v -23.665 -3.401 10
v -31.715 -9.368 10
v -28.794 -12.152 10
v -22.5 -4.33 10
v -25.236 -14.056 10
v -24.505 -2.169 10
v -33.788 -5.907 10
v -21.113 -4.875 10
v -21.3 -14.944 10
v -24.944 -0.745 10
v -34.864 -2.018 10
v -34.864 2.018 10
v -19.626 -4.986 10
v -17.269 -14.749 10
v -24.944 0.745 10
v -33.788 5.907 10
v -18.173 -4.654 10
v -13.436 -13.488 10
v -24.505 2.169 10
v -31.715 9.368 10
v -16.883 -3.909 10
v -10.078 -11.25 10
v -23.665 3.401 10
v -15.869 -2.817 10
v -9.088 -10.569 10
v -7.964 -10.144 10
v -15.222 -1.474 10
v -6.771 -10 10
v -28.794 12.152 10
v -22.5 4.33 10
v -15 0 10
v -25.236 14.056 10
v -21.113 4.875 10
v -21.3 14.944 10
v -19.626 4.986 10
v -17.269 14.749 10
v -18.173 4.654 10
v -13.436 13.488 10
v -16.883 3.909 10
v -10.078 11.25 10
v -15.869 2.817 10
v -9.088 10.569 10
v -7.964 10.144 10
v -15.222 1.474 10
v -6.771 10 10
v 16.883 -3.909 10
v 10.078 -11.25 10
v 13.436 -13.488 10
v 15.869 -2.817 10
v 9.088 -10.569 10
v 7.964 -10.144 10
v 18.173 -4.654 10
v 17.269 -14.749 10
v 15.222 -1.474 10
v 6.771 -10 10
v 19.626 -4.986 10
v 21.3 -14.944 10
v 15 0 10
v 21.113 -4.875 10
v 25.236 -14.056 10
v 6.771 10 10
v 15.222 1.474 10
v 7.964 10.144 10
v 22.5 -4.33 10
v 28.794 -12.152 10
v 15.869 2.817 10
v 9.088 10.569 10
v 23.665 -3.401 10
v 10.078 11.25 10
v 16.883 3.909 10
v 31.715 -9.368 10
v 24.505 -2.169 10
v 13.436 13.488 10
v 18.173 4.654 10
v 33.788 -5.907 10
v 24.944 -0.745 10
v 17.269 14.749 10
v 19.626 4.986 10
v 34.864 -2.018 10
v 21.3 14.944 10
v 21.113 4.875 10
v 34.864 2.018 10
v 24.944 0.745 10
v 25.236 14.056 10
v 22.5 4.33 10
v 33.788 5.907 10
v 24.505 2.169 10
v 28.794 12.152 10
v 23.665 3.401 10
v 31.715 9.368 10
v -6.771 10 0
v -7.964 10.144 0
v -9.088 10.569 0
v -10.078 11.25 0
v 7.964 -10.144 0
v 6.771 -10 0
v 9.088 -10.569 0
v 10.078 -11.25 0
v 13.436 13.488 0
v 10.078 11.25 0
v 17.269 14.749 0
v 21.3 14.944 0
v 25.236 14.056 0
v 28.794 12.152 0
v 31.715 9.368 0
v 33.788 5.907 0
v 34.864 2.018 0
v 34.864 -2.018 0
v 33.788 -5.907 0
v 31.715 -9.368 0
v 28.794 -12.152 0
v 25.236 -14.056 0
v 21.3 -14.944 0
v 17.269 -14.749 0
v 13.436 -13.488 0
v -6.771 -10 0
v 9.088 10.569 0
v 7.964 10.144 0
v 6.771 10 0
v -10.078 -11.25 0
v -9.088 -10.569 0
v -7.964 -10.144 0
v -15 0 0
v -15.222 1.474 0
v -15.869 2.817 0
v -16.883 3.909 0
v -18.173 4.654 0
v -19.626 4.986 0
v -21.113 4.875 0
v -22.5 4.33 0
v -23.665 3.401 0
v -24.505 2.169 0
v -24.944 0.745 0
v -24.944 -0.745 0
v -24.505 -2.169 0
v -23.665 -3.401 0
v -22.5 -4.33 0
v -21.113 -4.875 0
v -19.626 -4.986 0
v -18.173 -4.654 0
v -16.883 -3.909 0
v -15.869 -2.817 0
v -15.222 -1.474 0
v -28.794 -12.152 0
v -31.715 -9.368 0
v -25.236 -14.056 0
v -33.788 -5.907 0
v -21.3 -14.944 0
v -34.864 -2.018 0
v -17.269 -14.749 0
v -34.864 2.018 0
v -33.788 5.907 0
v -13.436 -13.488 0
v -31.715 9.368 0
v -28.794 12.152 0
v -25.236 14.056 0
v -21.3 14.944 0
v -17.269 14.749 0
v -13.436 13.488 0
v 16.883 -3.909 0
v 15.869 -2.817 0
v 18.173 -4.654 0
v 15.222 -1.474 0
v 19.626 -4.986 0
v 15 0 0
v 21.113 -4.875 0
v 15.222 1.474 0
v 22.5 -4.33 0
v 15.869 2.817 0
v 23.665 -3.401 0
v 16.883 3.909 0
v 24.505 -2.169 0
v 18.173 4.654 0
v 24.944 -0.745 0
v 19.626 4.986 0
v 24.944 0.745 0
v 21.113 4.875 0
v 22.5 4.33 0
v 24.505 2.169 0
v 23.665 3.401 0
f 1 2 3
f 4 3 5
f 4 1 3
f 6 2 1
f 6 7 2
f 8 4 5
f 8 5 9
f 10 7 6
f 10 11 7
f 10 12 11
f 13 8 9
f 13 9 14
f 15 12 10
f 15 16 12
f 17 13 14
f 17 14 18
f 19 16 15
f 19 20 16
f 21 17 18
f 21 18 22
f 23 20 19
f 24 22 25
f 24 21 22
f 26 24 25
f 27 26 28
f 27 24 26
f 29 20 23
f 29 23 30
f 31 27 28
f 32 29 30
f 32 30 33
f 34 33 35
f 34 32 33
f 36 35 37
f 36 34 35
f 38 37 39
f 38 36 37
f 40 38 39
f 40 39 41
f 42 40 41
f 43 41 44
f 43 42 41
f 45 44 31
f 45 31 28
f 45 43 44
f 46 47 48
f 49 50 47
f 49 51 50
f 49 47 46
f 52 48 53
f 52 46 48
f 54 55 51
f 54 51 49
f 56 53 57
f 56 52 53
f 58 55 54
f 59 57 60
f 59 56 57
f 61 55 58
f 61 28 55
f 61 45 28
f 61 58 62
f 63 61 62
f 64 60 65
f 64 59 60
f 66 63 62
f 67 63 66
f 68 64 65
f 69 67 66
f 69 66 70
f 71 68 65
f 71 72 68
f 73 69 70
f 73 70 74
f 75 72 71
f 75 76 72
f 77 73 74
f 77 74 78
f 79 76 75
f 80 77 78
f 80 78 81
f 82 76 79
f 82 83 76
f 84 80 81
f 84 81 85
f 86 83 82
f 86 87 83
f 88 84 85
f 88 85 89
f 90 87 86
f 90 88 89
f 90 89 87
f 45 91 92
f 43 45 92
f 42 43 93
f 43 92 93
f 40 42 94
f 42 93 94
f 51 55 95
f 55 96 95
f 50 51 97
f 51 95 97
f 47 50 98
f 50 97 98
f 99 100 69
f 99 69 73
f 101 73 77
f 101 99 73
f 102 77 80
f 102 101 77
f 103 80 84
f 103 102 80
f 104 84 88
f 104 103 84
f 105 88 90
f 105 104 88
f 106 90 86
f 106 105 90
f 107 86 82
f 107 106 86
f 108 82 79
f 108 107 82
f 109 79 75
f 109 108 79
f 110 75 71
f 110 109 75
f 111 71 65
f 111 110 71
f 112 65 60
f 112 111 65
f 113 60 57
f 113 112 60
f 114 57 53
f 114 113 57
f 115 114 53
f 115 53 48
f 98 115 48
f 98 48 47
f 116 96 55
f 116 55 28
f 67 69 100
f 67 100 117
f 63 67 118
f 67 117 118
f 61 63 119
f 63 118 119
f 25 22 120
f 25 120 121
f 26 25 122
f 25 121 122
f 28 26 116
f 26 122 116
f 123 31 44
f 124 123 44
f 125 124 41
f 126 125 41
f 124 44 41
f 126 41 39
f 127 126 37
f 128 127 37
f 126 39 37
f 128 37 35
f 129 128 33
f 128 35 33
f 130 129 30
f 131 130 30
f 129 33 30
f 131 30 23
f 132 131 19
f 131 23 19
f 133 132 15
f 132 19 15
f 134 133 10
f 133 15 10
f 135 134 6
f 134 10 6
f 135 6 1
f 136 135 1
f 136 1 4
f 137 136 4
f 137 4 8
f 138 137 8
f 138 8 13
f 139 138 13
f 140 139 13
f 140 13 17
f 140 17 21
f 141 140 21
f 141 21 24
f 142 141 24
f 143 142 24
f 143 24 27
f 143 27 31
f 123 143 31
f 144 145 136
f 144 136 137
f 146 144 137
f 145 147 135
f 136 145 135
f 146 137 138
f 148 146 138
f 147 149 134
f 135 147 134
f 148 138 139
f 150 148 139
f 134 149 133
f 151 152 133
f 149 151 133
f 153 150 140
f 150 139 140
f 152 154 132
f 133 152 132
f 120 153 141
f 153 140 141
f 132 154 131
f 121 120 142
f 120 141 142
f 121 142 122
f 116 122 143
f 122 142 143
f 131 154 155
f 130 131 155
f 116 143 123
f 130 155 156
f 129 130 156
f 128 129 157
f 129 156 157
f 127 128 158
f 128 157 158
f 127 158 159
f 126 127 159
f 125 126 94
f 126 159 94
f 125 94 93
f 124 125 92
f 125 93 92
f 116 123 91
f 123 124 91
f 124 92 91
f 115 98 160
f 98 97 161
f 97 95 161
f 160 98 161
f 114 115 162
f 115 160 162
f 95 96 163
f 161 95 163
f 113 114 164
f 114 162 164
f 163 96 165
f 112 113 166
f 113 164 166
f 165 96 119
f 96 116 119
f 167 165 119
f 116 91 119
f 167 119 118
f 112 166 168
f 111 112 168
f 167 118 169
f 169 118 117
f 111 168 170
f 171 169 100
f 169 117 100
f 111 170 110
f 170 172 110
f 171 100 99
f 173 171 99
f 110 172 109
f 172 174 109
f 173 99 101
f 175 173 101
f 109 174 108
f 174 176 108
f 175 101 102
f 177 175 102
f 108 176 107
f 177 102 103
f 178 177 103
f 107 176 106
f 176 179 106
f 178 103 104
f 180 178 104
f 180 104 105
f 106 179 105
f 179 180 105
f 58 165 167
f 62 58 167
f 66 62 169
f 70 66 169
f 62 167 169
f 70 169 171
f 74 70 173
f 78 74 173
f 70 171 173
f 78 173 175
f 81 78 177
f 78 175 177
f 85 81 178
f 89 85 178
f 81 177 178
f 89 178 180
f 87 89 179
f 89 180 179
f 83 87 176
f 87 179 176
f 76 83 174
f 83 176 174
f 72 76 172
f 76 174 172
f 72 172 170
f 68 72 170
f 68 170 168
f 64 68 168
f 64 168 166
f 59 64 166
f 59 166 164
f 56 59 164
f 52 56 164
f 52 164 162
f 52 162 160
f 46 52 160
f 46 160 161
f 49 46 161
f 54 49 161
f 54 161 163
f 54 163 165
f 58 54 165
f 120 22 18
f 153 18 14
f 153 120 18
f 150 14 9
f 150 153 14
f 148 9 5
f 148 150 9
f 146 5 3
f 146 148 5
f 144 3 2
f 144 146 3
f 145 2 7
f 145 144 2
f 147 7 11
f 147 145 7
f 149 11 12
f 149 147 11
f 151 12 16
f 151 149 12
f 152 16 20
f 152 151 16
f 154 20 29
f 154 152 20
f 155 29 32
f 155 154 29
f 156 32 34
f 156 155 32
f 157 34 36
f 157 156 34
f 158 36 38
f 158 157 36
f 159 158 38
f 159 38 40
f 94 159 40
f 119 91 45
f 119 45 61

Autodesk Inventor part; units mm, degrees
ref_plane "YZ Plane" through (0, 0, 0) normal (1, 0, 0) x (0, 1, 0)
ref_plane "XZ Plane" through (0, 0, 0) normal (0, 1, 0) x (-1, 0, 0)
ref_plane "XY Plane" through (0, 0, 0) normal (0, 0, 1) x (1, 0, 0)
sketch "Эскиз1" plane through (0, 0, 0) normal (0, 0, 1) x (1, 0, 0)
  line L0 (-49, 0) -> (49, 0) projected
  line L1 (-6.7712, 10) -> (6.7712, 10)
  line L2 (6.7712, -10) -> (-6.7712, -10)
  line L3 (0, -21) -> (0, 21) projected
  arc A0 (-10.0784, 11.25) -> (-10.0784, -11.25) centre (-20, 0) ccw
  arc A1 (10.0784, -11.25) -> (10.0784, 11.25) centre (20, 0) ccw
  circle A2 centre (-20, 0) radius 5
  circle A3 centre (20, 0) radius 5
  arc A4 (-10.0784, 11.25) -> (-6.7712, 10) centre (-6.7712, 15) ccw
  arc A5 (-6.7712, -10) -> (-10.0784, -11.25) centre (-6.7712, -15) ccw
  arc A6 (10.0784, -11.25) -> (6.7712, -10) centre (6.7712, -15) ccw
  arc A7 (6.7712, 10) -> (10.0784, 11.25) centre (6.7712, 15) ccw
  point P0 (0, 0)
  point P1 (-8.8197, 10)
  point P2 (8.8197, -10)
  point P3 (8.8197, 10)
  point P4 (-8.8197, -10)
  dimension "d1" = 20
  dimension "d3" = 15
  dimension "d4" = 10
  dimension "d5" = 5
  dimension "d8" = 40
extrude "Выдавливание1" add sketch "Эскиз1" along normal blind 10
sketch "Эскиз2" plane through (0, 0, 0) normal (0, 0, -1) x (-1, 0, 0)
  circle A0 centre (-20, 0) radius 5 projected
  point P0 (0, 0)
extrude "Выдавливание2" cut sketch "Эскиз2" along normal through all both and the other way through all
sketch "Эскиз3" plane through (0, 0, 10) normal (0, 0, 1) x (1, 0, 0)
  circle A0 centre (-20, 0) radius 5 projected
  point P0 (0, 0)
extrude "Выдавливание3" cut sketch "Эскиз3" along normal through all both and the other way through all
properties part number "кривошип_v1"
